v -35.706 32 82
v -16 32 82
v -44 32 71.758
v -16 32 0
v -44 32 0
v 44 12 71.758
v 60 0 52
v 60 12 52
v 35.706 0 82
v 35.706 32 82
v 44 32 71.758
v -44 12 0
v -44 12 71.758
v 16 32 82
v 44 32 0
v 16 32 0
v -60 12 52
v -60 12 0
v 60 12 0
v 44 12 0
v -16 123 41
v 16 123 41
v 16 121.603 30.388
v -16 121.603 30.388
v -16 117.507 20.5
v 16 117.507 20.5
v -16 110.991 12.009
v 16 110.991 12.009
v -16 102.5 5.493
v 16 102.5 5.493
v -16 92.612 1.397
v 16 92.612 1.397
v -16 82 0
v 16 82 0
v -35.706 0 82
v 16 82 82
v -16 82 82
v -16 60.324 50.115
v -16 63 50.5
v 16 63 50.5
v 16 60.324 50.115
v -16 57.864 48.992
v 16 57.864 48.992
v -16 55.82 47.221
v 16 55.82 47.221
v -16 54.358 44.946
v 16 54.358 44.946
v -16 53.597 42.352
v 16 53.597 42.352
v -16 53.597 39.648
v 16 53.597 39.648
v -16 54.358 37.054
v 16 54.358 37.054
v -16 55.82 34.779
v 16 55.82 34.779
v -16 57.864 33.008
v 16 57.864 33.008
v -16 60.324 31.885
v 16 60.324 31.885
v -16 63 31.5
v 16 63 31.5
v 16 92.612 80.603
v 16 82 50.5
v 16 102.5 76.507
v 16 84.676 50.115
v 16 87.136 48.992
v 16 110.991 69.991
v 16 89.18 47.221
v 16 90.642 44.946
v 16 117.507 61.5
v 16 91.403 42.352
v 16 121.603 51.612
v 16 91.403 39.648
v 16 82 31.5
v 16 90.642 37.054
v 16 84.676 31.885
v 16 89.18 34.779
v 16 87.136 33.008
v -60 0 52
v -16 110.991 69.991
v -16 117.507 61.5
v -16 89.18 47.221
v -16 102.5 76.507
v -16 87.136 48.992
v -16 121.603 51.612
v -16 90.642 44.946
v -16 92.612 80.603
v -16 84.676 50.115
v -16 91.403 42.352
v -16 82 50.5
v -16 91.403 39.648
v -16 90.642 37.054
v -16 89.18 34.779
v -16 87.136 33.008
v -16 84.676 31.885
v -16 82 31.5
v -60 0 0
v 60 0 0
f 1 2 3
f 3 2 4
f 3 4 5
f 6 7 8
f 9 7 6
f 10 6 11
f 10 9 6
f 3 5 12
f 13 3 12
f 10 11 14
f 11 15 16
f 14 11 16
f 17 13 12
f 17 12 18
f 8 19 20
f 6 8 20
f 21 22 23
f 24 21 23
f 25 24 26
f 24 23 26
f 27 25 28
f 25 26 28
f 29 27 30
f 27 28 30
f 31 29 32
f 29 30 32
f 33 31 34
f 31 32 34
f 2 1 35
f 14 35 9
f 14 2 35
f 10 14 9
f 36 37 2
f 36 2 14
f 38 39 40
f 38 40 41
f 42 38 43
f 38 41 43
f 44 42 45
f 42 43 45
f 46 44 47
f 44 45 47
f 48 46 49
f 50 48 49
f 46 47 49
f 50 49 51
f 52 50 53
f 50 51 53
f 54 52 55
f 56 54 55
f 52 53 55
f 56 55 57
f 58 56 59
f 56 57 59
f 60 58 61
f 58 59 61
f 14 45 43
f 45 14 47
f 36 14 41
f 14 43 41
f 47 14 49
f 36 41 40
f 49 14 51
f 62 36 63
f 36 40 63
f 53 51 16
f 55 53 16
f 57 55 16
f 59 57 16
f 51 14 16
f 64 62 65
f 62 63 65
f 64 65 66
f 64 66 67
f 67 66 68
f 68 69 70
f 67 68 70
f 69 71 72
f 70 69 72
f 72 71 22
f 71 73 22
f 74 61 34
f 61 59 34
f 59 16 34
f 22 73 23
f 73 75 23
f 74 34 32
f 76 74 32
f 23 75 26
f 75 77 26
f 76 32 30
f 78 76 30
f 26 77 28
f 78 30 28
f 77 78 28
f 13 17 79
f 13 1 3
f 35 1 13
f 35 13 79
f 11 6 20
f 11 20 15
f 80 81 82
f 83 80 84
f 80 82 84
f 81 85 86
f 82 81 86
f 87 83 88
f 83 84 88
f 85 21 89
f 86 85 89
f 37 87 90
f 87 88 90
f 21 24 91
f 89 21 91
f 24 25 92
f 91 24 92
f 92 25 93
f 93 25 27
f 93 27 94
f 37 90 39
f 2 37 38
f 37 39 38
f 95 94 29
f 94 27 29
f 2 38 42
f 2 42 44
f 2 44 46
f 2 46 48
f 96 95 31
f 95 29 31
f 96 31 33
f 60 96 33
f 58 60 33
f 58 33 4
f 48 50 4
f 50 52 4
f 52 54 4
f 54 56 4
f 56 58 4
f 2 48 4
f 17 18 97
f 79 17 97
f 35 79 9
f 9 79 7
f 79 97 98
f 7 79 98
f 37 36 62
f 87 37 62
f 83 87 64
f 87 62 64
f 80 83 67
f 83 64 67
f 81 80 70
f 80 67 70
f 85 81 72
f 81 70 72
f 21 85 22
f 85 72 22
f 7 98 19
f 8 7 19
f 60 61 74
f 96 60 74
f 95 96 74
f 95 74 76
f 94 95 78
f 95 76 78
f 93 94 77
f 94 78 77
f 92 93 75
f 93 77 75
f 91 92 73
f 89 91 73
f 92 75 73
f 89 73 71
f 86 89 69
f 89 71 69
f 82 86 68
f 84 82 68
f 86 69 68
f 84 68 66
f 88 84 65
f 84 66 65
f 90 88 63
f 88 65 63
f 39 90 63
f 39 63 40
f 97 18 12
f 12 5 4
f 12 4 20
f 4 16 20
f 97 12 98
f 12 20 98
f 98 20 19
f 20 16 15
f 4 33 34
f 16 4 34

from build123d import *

# Parameters (mm, degrees)
BOSS_EXTRUDE1_DEPTH = 82
CHAMFER6_SIZE       = 30
CHAMFER6_SIZE2      = 24.293520996
CHAMFER7_SIZE       = 30
CHAMFER7_SIZE2      = 24.293520996
CUT_EXTRUDE2_DEPTH  = 82


with BuildPart() as part:
    # Sketch1 → Boss-Extrude1 (new body)
    with BuildSketch(Plane.XY):
        Polygon((-60, 0), (60, 0), (60, 12), (44, 12), (44, 32), (16, 32), (16, 123), (-16, 123), (-16, 32), (-44, 32), (-44, 12), (-60, 12), align=None)
    extrude(amount=BOSS_EXTRUDE1_DEPTH)

    # Chamfer6
    chamfer6_edges = [part.edges().sort_by_distance(p)[0] for p in [
        (60, 6, 82),
    ]]
    chamfer6_side = [part.faces().sort_by_distance(p)[0] for p in [
        (60, 6, 41),
    ]]
    chamfer(chamfer6_edges, length=CHAMFER6_SIZE, length2=CHAMFER6_SIZE2, reference=chamfer6_side[0])

    # Chamfer7
    chamfer7_edges = [part.edges().sort_by_distance(p)[0] for p in [
        (-60, 6, 82),
    ]]
    chamfer7_side = [part.faces().sort_by_distance(p)[0] for p in [
        (-60, 6, 41),
    ]]
    chamfer(chamfer7_edges, length=CHAMFER7_SIZE, length2=CHAMFER7_SIZE2, reference=chamfer7_side[0])

    # Sketch8 → Cut-Extrude2 (cut)
    with BuildSketch(Plane(origin=(16, 0, 0), x_dir=(0, 0, -1), z_dir=(1, 0, 0))):
        with BuildLine():
            Line((-82, 123), (-82, 82))
            ThreePointArc((-82, 82), (-69.991378029, 110.991378029), (-41, 123))
            Line((-41, 123), (-82, 123))
        make_face()
        with BuildLine():
            ThreePointArc((-31.5, 82), (-41, 91.5), (-50.5, 82))
            Line((-50.5, 82), (-50.5, 63))
            ThreePointArc((-50.5, 63), (-41, 53.5), (-31.5, 63))
            Line((-31.5, 63), (-31.5, 82))
        make_face()
        with BuildLine():
            Line((0, 123), (-41, 123))
            ThreePointArc((-41, 123), (-12.008621971, 110.991378029), (0, 82))
            Line((0, 82), (0, 123))
        make_face()
    extrude(amount=-CUT_EXTRUDE2_DEPTH, mode=Mode.SUBTRACT)


solid = part.part
